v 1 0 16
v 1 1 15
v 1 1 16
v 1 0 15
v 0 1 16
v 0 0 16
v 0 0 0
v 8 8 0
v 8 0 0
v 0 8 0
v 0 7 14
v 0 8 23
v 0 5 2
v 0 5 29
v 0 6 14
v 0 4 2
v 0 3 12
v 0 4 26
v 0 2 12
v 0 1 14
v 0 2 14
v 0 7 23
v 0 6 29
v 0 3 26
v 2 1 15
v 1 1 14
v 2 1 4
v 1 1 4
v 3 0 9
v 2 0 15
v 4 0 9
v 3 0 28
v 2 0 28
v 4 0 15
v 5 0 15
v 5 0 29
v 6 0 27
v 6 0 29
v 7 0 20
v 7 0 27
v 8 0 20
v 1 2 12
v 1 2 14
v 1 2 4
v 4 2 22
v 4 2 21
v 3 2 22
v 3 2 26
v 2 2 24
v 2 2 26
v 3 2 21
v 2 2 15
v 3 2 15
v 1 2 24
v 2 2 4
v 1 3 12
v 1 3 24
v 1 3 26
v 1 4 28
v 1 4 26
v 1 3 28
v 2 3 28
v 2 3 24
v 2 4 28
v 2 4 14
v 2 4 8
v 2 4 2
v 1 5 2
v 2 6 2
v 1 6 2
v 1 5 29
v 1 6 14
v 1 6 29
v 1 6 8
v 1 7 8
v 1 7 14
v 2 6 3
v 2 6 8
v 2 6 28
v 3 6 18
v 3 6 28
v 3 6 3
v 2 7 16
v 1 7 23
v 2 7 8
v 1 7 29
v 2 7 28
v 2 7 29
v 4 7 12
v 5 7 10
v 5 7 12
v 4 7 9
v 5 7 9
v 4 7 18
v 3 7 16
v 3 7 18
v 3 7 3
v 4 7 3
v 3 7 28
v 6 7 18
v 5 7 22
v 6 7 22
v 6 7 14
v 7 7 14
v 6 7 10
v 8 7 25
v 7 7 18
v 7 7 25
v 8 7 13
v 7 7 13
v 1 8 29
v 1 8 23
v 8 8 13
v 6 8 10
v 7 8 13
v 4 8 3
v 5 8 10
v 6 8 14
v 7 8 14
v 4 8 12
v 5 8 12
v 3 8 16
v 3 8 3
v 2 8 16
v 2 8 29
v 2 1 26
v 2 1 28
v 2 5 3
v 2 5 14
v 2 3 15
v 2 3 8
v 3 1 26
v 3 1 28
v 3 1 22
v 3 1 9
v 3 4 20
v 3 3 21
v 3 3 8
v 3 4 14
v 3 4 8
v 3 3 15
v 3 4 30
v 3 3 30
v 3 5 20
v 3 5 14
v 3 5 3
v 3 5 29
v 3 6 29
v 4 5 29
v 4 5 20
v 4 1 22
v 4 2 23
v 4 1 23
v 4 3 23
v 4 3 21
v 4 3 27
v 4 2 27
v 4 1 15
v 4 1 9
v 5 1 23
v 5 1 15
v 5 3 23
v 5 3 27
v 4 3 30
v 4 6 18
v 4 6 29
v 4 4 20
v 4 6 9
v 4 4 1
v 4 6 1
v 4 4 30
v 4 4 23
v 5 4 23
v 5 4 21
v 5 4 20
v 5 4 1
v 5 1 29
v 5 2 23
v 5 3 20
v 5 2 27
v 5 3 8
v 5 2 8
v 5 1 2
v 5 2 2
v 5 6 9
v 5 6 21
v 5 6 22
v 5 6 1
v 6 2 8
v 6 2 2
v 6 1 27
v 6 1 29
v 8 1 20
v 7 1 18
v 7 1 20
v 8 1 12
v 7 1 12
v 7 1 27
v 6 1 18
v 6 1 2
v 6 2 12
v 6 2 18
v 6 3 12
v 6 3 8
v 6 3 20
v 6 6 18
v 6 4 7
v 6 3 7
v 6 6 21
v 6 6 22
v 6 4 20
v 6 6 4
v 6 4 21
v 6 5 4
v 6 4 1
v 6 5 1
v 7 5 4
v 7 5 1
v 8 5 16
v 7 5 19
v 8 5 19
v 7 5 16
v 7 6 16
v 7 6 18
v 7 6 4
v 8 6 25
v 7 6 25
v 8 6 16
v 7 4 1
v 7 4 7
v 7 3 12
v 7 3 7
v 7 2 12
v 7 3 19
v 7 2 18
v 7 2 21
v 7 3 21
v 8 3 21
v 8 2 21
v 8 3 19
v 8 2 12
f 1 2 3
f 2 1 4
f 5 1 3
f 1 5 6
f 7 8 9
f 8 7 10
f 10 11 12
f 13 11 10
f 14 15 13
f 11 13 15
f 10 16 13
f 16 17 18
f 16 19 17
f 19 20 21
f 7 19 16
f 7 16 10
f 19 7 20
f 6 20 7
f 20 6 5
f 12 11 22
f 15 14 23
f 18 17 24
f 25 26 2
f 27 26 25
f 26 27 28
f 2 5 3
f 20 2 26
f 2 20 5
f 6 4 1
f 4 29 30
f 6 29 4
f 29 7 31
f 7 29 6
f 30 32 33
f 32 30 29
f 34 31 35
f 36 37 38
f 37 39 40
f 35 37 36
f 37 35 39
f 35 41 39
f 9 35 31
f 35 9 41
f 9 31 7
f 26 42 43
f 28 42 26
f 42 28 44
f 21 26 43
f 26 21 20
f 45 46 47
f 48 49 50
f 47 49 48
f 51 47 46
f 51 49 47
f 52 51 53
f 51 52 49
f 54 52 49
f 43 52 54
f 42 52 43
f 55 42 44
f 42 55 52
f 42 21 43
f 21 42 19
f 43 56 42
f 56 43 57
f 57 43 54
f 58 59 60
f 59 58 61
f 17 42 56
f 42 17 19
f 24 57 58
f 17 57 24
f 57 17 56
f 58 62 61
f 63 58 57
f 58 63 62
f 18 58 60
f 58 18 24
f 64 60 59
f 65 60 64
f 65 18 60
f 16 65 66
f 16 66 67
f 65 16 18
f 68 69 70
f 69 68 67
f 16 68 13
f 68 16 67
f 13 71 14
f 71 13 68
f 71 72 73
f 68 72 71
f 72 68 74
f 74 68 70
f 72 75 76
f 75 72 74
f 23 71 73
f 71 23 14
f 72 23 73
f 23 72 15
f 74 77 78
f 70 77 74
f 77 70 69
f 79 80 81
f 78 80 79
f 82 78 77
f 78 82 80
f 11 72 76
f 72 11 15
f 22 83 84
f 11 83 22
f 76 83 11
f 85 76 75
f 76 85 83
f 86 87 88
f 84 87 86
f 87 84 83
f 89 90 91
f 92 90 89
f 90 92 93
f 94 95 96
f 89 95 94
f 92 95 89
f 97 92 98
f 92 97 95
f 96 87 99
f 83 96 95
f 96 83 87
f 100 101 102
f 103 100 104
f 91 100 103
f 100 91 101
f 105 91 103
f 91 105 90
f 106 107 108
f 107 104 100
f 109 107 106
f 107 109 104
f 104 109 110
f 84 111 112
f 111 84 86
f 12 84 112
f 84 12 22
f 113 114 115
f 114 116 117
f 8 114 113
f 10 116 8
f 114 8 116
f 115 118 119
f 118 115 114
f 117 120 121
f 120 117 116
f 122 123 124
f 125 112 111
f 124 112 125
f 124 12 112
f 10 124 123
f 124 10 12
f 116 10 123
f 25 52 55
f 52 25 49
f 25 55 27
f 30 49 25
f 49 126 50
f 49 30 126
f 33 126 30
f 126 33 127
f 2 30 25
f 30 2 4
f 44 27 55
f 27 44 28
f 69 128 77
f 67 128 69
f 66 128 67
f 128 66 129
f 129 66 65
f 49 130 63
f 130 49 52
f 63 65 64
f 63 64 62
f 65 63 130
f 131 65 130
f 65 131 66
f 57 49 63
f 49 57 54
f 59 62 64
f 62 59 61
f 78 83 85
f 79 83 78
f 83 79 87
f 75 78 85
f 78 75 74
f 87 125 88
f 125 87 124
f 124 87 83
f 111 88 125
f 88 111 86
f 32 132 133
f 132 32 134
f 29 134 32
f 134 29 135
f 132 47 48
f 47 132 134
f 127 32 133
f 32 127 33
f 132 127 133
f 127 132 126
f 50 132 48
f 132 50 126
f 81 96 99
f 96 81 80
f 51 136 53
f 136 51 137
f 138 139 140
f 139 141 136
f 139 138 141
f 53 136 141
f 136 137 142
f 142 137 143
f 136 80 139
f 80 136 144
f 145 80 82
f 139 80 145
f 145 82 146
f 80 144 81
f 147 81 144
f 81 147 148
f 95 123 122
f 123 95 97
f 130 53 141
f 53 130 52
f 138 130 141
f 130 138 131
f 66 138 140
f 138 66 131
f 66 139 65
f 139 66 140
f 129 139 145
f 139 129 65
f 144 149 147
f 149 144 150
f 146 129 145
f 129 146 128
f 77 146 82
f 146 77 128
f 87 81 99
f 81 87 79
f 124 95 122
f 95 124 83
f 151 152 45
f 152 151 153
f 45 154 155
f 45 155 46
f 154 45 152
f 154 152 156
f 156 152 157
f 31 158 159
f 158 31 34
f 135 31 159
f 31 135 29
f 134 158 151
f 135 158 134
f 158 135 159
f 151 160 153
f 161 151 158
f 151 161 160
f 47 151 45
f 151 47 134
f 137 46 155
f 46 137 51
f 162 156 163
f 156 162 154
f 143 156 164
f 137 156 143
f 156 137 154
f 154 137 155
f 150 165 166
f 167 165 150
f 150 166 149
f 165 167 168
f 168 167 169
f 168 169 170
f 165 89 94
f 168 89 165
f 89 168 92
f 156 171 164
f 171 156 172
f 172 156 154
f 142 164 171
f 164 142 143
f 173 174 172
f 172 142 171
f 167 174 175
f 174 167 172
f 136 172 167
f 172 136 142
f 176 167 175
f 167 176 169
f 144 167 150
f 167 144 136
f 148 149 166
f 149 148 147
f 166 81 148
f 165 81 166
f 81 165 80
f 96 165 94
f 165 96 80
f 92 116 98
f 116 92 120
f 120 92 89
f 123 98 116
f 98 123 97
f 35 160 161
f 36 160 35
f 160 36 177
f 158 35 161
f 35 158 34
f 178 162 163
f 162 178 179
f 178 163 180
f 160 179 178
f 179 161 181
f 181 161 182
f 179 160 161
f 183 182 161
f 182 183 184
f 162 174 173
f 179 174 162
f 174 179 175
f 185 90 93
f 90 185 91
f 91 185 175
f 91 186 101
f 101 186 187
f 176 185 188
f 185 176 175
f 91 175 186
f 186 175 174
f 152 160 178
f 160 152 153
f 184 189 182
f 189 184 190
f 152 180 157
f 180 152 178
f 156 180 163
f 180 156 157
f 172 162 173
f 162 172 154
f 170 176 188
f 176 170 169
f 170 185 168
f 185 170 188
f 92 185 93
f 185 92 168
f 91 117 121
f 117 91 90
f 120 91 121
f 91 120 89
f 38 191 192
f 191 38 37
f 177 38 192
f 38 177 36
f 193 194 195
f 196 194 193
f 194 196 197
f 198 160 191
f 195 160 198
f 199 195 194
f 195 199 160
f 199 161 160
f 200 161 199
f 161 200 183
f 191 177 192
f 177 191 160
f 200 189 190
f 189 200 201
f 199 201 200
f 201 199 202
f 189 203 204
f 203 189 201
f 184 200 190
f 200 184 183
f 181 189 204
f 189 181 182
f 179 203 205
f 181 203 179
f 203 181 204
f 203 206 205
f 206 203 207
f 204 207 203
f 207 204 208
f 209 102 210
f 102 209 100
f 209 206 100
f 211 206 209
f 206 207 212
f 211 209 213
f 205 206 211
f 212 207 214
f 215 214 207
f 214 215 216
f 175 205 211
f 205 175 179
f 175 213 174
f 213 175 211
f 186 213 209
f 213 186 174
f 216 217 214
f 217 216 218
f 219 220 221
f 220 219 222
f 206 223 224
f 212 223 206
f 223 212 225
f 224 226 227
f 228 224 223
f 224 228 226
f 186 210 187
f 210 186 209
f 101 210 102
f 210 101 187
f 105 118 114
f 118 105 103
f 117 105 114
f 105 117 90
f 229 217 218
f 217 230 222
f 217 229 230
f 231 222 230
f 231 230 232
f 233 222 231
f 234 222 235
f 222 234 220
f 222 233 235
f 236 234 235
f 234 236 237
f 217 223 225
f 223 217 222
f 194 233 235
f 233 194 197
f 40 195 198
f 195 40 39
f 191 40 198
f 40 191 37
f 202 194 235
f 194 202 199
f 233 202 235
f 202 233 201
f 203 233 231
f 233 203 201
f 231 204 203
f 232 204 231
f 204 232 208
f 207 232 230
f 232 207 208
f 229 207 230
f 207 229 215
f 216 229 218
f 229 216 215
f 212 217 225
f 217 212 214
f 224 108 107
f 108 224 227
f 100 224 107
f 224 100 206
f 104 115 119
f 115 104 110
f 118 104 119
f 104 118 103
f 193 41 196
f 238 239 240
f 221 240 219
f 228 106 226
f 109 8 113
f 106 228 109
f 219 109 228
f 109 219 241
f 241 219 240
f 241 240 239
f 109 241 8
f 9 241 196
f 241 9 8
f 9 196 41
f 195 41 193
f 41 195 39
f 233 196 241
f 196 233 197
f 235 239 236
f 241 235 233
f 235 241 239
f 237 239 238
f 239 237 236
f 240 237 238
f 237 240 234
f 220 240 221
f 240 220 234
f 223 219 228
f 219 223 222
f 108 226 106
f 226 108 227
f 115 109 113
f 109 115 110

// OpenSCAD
cube([1,1,16]);
translate([0, 1, 0]) {
    cube([1, 1, 14]);
    }
translate([0, 2, 0]) {
    cube([1, 1, 12]);
    }
translate([0, 3, 0]) {
    cube([1, 1, 26]);
    }
translate([0, 4, 0]) {
    cube([1, 1, 2]);
    }
translate([0, 5, 0]) {
    cube([1, 1, 29]);
    }
translate([0, 6, 0]) {
    cube([1, 1, 14]);
    }
translate([0, 7, 0]) {
    cube([1, 1, 23]);
    }
translate([1, 0, 0]) {
    cube([1, 1, 15]);
    }
translate([1, 1, 0]) {
    cube([1, 1, 4]);
    }
translate([1, 2, 0]) {
    cube([1, 1, 24]);
    }
translate([1, 3, 0]) {
    cube([1, 1, 28]);
    }
translate([1, 4, 0]) {
    cube([1, 1, 2]);
    }
translate([1, 5, 0]) {
    cube([1, 1, 2]);
    }
translate([1, 6, 0]) {
    cube([1, 1, 8]);
    }
translate([1, 7, 0]) {
    cube([1, 1, 29]);
    }
translate([2, 0, 0]) {
    cube([1, 1, 28]);
    }
translate([2, 1, 0]) {
    cube([1, 1, 26]);
    }
translate([2, 2, 0]) {
    cube([1, 1, 15]);
    }
translate([2, 3, 0]) {
    cube([1, 1, 8]);
    }
translate([2, 4, 0]) {
    cube([1, 1, 14]);
    }
translate([2, 5, 0]) {
    cube([1, 1, 3]);
    }
translate([2, 6, 0]) {
    cube([1, 1, 28]);
    }
translate([2, 7, 0]) {
    cube([1, 1, 16]);
    }
translate([3, 0, 0]) {
    cube([1, 1, 9]);
    }
translate([3, 1, 0]) {
    cube([1, 1, 22]);
    }
translate([3, 2, 0]) {
    cube([1, 1, 21]);
    }
translate([3, 3, 0]) {
    cube([1, 1, 30]);
    }
translate([3, 4, 0]) {
    cube([1, 1, 20]);
    }
translate([3, 5, 0]) {
    cube([1, 1, 29]);
    }
translate([3, 6, 0]) {
    cube([1, 1, 18]);
    }
translate([3, 7, 0]) {
    cube([1, 1, 3]);
    }
translate([4, 0, 0]) {
    cube([1, 1, 15]);
    }
translate([4, 1, 0]) {
    cube([1, 1, 23]);
    }
translate([4, 2, 0]) {
    cube([1, 1, 27]);
    }
translate([4, 3, 0]) {
    cube([1, 1, 23]);
    }
translate([4, 4, 0]) {
    cube([1, 1, 1]);
    }
translate([4, 5, 0]) {
    cube([1, 1, 1]);
    }
translate([4, 6, 0]) {
    cube([1, 1, 9]);
    }
translate([4, 7, 0]) {
    cube([1, 1, 12]);
    }
translate([5, 0, 0]) {
    cube([1, 1, 29]);
    }
translate([5, 1, 0]) {
    cube([1, 1, 2]);
    }
translate([5, 2, 0]) {
    cube([1, 1, 8]);
    }
translate([5, 3, 0]) {
    cube([1, 1, 20]);
    }
translate([5, 4, 0]) {
    cube([1, 1, 21]);
    }
translate([5, 5, 0]) {
    cube([1, 1, 21]);
    }
translate([5, 6, 0]) {
    cube([1, 1, 22]);
    }
translate([5, 7, 0]) {
    cube([1, 1, 10]);
    }
translate([6, 0, 0]) {
    cube([1, 1, 27]);
    }
translate([6, 1, 0]) {
    cube([1, 1, 18]);
    }
translate([6, 2, 0]) {
    cube([1, 1, 12]);
    }
translate([6, 3, 0]) {
    cube([1, 1, 7]);
    }
translate([6, 4, 0]) {
    cube([1, 1, 1]);
    }
translate([6, 5, 0]) {
    cube([1, 1, 4]);
    }
translate([6, 6, 0]) {
    cube([1, 1, 18]);
    }
translate([6, 7, 0]) {
    cube([1, 1, 14]);
    }
translate([7, 0, 0]) {
    cube([1, 1, 20]);
    }
translate([7, 1, 0]) {
    cube([1, 1, 12]);
    }
translate([7, 2, 0]) {
    cube([1, 1, 21]);
    }
translate([7, 3, 0]) {
    cube([1, 1, 19]);
    }
translate([7, 4, 0]) {
    cube([1, 1, 19]);
    }
translate([7, 5, 0]) {
    cube([1, 1, 16]);
    }
translate([7, 6, 0]) {
    cube([1, 1, 25]);
    }
translate([7, 7, 0]) {
    cube([1, 1, 13]);
    }
